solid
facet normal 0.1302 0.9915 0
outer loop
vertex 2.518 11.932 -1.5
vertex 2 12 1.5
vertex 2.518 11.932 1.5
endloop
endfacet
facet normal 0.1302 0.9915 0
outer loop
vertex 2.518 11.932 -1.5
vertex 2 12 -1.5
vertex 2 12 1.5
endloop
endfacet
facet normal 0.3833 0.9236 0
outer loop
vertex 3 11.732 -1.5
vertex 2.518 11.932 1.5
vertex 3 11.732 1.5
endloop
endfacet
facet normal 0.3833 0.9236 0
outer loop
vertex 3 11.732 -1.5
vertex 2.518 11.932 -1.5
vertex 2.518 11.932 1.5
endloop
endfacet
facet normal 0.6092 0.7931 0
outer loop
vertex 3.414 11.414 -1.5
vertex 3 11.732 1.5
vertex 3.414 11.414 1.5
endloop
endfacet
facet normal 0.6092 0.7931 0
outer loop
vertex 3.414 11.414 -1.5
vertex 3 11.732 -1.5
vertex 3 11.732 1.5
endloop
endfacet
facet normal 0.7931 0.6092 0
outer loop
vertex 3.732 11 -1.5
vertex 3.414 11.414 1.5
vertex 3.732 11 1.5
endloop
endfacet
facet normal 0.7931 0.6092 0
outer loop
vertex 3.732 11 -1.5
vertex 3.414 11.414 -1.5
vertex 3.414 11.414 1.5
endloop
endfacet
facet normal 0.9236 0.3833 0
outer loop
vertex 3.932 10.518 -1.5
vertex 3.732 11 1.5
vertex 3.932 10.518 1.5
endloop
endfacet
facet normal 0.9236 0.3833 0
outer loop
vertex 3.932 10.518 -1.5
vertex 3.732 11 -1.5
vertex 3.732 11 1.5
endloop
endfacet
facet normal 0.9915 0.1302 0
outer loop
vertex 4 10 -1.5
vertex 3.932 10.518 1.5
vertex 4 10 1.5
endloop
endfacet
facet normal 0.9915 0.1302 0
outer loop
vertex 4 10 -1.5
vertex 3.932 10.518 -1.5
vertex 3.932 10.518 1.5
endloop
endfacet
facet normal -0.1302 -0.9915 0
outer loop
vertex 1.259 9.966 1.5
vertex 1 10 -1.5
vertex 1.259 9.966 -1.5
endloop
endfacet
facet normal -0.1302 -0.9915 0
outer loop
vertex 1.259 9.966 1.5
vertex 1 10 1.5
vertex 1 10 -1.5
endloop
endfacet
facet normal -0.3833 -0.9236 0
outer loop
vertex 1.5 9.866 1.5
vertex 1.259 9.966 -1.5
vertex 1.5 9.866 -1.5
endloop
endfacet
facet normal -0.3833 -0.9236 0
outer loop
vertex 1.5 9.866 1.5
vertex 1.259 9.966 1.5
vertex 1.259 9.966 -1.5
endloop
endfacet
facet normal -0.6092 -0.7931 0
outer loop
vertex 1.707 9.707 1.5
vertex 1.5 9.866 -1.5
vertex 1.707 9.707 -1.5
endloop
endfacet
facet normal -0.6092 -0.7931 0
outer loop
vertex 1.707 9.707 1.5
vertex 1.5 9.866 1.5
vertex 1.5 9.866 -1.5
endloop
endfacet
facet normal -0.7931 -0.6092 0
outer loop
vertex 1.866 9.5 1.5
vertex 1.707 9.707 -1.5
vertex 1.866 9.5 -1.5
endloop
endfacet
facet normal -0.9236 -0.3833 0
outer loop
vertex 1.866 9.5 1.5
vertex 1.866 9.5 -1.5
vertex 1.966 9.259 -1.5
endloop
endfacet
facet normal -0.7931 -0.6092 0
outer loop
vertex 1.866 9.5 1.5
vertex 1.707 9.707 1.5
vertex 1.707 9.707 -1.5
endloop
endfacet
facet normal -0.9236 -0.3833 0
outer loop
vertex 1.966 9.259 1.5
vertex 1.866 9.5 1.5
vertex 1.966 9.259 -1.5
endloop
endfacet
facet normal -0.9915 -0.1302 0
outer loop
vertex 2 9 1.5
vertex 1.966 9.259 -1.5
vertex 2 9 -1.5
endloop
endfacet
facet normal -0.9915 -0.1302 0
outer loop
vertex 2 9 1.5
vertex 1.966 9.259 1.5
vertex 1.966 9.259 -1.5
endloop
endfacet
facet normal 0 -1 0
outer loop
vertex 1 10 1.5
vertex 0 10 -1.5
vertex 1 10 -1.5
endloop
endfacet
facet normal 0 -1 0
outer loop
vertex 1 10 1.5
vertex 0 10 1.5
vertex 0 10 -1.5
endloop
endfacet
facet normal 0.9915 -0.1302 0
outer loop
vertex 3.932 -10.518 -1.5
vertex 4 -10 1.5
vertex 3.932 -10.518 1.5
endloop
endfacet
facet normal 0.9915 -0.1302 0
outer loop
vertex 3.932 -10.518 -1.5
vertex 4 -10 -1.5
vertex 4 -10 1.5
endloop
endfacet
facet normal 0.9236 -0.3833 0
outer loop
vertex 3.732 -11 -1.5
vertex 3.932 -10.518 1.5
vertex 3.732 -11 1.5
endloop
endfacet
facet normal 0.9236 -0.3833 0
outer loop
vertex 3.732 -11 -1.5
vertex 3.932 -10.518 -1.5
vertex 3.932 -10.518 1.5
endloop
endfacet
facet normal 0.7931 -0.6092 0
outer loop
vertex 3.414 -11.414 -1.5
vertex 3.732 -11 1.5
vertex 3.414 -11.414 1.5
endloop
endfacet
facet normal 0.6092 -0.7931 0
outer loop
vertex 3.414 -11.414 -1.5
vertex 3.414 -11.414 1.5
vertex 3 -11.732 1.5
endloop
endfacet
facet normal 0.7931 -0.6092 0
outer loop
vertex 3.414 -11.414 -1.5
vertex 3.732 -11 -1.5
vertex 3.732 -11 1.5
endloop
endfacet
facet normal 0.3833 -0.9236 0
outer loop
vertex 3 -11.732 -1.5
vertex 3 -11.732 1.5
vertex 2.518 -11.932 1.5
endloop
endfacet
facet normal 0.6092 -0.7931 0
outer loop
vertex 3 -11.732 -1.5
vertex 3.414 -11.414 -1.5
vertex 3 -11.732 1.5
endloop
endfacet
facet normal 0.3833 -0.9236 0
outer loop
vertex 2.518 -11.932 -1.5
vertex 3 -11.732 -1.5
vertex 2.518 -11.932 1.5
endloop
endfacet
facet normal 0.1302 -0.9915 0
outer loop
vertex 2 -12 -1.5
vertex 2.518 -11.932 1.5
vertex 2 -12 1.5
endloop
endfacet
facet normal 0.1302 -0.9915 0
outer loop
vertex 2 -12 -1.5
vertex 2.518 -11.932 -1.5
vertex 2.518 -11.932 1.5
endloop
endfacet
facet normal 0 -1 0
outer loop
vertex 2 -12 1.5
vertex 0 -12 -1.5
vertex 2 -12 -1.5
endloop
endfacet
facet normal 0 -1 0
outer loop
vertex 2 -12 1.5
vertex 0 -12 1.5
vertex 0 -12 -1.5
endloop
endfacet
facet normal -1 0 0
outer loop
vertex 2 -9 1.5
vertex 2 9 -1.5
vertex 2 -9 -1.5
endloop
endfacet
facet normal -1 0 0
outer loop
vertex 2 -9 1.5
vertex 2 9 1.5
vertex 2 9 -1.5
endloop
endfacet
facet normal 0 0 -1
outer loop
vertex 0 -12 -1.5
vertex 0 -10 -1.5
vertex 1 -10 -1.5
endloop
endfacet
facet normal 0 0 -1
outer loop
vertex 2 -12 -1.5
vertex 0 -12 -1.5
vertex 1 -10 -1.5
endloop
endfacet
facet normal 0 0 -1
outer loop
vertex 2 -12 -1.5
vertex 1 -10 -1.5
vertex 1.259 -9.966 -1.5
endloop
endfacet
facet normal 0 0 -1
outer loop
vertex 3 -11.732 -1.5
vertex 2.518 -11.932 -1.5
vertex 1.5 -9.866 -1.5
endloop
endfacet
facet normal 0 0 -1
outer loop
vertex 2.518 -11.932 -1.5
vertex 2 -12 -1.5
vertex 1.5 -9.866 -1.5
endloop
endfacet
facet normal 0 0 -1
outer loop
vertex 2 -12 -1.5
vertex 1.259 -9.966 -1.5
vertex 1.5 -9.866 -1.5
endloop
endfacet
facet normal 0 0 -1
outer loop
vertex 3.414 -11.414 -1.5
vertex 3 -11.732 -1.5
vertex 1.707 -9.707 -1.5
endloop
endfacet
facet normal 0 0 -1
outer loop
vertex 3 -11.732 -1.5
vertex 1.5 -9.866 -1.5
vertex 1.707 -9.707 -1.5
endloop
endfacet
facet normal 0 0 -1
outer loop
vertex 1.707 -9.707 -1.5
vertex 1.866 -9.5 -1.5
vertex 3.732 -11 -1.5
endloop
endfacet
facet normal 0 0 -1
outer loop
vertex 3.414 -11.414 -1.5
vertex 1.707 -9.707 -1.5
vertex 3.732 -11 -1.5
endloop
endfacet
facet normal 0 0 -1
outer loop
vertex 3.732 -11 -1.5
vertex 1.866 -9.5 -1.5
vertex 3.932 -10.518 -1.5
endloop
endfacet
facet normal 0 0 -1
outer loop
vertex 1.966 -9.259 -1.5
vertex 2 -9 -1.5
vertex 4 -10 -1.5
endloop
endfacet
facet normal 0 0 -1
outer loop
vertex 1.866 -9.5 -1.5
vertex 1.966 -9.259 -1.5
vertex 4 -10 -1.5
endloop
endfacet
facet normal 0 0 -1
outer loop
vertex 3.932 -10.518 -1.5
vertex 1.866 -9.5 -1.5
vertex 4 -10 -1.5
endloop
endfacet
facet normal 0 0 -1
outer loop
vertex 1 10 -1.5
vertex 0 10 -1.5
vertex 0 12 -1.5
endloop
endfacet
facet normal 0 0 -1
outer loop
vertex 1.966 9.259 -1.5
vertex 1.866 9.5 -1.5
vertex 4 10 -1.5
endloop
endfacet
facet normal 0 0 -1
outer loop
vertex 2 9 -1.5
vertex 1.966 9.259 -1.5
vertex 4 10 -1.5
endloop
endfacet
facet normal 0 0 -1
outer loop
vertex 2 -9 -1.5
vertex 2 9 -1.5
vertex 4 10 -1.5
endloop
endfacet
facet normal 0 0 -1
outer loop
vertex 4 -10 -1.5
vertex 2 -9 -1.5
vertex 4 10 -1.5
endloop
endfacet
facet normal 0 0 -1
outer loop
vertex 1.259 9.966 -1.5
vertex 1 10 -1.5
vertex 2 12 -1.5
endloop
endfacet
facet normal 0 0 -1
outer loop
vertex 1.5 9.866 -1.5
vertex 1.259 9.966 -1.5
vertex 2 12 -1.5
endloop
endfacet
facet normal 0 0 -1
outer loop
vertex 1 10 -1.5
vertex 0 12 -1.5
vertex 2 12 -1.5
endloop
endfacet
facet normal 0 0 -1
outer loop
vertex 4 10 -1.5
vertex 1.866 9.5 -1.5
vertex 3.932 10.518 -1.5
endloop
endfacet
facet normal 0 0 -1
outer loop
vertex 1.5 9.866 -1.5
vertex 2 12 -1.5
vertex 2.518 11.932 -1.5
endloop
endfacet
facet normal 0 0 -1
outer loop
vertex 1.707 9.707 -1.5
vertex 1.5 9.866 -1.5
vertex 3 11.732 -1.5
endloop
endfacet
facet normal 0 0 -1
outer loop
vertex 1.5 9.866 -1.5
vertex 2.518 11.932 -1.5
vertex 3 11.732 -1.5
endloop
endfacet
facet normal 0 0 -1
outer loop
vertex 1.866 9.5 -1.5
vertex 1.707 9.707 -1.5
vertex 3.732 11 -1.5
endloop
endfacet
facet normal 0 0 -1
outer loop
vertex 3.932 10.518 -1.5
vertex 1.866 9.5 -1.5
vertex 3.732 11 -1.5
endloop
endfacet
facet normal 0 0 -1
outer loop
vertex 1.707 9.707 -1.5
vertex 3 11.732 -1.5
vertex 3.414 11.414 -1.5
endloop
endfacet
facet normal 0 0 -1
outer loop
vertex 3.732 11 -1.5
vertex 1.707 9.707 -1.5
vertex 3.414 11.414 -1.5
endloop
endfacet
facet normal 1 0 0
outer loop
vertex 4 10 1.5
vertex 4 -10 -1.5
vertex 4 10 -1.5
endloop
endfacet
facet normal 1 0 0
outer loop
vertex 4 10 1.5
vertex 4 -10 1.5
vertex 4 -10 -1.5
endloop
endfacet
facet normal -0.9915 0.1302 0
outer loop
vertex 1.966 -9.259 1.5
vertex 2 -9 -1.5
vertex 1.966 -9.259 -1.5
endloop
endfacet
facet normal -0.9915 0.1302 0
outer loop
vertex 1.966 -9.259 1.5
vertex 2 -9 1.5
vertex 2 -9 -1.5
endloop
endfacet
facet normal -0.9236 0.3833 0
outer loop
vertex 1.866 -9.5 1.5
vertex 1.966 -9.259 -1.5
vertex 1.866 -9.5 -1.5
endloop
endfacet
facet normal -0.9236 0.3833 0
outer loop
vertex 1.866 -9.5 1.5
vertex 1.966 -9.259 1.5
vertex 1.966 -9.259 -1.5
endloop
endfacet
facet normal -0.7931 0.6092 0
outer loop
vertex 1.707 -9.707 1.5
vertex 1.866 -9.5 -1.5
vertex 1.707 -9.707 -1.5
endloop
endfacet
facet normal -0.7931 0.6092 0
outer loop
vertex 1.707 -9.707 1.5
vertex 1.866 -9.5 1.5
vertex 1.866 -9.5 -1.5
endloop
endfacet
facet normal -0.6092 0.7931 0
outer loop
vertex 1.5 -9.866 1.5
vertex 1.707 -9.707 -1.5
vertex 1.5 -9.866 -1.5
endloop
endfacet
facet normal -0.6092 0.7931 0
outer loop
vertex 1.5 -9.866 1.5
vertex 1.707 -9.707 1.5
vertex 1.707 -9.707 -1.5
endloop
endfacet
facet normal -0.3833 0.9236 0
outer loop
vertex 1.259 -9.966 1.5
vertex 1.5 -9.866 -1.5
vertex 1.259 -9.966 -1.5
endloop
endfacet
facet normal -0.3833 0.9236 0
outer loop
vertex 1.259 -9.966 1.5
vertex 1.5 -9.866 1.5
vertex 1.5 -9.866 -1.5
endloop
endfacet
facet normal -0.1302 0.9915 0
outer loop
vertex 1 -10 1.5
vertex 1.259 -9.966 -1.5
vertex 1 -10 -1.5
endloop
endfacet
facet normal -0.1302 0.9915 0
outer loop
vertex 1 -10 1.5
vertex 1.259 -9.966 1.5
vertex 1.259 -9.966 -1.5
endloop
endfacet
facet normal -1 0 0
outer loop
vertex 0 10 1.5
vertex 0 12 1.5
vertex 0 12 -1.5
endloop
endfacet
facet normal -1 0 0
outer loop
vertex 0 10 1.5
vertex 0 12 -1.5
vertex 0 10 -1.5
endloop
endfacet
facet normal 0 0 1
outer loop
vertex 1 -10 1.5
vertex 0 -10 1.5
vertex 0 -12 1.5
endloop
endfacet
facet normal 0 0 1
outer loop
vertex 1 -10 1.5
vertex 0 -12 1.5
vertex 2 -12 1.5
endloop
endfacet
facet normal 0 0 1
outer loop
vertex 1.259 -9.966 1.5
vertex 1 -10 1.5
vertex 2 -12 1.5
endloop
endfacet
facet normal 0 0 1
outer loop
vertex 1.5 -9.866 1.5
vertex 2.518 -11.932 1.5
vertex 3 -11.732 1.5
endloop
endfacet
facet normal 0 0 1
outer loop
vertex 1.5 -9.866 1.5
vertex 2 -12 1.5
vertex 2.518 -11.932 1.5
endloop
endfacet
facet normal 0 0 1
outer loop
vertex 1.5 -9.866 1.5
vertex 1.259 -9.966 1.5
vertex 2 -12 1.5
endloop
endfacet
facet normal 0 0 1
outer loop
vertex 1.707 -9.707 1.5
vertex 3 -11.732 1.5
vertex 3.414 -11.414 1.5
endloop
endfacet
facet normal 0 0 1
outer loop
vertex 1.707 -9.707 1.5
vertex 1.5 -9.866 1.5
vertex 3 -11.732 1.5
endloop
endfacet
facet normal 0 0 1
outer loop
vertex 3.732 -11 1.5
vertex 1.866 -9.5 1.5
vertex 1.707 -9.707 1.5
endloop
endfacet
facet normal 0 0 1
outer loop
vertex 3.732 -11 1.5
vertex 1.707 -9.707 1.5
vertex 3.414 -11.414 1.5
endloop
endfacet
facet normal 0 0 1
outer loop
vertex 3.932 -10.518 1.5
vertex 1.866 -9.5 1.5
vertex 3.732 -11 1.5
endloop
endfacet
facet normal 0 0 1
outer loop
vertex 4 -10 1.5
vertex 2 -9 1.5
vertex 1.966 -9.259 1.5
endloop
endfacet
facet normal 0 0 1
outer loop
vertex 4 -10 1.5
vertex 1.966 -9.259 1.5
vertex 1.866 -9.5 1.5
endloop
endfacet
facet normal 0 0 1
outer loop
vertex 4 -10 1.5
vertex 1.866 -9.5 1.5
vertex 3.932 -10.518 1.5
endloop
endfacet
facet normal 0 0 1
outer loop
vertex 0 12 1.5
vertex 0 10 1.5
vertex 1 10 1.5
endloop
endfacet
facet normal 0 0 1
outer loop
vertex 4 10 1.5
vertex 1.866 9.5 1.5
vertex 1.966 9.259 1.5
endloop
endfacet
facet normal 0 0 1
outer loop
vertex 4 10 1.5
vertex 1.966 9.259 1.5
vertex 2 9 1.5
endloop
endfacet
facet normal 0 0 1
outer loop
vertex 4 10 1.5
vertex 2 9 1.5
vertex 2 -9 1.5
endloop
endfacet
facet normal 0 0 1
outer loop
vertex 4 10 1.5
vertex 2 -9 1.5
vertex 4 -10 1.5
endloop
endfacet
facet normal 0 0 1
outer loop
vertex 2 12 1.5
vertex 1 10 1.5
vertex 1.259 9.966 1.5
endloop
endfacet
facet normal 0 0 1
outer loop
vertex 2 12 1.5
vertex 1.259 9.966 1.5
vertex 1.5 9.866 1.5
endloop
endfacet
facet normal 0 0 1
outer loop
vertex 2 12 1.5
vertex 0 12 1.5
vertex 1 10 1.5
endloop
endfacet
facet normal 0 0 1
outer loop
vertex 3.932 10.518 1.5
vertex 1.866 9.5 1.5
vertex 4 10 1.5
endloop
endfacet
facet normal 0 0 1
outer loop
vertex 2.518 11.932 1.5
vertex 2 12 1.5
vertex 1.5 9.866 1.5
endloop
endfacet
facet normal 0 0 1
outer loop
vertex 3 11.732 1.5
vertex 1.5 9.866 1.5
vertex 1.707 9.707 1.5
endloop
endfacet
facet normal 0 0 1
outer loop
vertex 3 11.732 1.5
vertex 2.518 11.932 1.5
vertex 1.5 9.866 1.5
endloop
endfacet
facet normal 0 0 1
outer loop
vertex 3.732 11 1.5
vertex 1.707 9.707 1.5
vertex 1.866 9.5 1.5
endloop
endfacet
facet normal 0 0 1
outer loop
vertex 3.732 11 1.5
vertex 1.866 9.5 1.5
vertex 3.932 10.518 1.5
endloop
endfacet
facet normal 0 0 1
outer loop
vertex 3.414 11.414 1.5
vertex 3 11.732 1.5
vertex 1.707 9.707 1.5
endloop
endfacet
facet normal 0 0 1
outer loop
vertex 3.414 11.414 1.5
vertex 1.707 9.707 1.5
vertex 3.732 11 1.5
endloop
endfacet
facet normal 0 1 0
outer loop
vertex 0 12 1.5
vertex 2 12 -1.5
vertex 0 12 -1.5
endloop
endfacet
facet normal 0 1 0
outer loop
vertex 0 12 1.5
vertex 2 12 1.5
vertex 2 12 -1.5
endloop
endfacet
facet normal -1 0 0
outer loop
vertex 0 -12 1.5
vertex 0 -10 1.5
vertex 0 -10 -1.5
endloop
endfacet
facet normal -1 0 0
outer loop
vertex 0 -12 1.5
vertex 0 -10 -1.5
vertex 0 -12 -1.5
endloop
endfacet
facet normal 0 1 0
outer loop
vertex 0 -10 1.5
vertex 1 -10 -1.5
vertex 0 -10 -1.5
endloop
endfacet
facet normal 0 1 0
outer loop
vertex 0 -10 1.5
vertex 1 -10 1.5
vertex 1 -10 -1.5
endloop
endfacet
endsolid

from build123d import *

# Parameters (mm, degrees)
F1_DEPTH = 1.5
F2_R     = 2
F3_R     = 1


with BuildPart() as f1:
    # F0 (on Top) → F1 (new body, symmetric)
    with BuildSketch(Plane.XY):
        Polygon((4, 12), (0, 12), (0, 10), (2, 10), (2, -10), (0, -10), (0, -12), (4, -12), align=None)
    extrude(amount=F1_DEPTH, both=True)

    # F2
    f2_edges = [f1.edges().sort_by_distance(p)[0] for p in [
        (4, -12, 0),
        (4, 12, 0),
    ]]
    fillet(f2_edges, radius=F2_R)

    # F3
    f3_edges = [f1.edges().sort_by_distance(p)[0] for p in [
        (2, 10, 0),
        (2, -10, 0),
    ]]
    fillet(f3_edges, radius=F3_R)


solid = f1.part
